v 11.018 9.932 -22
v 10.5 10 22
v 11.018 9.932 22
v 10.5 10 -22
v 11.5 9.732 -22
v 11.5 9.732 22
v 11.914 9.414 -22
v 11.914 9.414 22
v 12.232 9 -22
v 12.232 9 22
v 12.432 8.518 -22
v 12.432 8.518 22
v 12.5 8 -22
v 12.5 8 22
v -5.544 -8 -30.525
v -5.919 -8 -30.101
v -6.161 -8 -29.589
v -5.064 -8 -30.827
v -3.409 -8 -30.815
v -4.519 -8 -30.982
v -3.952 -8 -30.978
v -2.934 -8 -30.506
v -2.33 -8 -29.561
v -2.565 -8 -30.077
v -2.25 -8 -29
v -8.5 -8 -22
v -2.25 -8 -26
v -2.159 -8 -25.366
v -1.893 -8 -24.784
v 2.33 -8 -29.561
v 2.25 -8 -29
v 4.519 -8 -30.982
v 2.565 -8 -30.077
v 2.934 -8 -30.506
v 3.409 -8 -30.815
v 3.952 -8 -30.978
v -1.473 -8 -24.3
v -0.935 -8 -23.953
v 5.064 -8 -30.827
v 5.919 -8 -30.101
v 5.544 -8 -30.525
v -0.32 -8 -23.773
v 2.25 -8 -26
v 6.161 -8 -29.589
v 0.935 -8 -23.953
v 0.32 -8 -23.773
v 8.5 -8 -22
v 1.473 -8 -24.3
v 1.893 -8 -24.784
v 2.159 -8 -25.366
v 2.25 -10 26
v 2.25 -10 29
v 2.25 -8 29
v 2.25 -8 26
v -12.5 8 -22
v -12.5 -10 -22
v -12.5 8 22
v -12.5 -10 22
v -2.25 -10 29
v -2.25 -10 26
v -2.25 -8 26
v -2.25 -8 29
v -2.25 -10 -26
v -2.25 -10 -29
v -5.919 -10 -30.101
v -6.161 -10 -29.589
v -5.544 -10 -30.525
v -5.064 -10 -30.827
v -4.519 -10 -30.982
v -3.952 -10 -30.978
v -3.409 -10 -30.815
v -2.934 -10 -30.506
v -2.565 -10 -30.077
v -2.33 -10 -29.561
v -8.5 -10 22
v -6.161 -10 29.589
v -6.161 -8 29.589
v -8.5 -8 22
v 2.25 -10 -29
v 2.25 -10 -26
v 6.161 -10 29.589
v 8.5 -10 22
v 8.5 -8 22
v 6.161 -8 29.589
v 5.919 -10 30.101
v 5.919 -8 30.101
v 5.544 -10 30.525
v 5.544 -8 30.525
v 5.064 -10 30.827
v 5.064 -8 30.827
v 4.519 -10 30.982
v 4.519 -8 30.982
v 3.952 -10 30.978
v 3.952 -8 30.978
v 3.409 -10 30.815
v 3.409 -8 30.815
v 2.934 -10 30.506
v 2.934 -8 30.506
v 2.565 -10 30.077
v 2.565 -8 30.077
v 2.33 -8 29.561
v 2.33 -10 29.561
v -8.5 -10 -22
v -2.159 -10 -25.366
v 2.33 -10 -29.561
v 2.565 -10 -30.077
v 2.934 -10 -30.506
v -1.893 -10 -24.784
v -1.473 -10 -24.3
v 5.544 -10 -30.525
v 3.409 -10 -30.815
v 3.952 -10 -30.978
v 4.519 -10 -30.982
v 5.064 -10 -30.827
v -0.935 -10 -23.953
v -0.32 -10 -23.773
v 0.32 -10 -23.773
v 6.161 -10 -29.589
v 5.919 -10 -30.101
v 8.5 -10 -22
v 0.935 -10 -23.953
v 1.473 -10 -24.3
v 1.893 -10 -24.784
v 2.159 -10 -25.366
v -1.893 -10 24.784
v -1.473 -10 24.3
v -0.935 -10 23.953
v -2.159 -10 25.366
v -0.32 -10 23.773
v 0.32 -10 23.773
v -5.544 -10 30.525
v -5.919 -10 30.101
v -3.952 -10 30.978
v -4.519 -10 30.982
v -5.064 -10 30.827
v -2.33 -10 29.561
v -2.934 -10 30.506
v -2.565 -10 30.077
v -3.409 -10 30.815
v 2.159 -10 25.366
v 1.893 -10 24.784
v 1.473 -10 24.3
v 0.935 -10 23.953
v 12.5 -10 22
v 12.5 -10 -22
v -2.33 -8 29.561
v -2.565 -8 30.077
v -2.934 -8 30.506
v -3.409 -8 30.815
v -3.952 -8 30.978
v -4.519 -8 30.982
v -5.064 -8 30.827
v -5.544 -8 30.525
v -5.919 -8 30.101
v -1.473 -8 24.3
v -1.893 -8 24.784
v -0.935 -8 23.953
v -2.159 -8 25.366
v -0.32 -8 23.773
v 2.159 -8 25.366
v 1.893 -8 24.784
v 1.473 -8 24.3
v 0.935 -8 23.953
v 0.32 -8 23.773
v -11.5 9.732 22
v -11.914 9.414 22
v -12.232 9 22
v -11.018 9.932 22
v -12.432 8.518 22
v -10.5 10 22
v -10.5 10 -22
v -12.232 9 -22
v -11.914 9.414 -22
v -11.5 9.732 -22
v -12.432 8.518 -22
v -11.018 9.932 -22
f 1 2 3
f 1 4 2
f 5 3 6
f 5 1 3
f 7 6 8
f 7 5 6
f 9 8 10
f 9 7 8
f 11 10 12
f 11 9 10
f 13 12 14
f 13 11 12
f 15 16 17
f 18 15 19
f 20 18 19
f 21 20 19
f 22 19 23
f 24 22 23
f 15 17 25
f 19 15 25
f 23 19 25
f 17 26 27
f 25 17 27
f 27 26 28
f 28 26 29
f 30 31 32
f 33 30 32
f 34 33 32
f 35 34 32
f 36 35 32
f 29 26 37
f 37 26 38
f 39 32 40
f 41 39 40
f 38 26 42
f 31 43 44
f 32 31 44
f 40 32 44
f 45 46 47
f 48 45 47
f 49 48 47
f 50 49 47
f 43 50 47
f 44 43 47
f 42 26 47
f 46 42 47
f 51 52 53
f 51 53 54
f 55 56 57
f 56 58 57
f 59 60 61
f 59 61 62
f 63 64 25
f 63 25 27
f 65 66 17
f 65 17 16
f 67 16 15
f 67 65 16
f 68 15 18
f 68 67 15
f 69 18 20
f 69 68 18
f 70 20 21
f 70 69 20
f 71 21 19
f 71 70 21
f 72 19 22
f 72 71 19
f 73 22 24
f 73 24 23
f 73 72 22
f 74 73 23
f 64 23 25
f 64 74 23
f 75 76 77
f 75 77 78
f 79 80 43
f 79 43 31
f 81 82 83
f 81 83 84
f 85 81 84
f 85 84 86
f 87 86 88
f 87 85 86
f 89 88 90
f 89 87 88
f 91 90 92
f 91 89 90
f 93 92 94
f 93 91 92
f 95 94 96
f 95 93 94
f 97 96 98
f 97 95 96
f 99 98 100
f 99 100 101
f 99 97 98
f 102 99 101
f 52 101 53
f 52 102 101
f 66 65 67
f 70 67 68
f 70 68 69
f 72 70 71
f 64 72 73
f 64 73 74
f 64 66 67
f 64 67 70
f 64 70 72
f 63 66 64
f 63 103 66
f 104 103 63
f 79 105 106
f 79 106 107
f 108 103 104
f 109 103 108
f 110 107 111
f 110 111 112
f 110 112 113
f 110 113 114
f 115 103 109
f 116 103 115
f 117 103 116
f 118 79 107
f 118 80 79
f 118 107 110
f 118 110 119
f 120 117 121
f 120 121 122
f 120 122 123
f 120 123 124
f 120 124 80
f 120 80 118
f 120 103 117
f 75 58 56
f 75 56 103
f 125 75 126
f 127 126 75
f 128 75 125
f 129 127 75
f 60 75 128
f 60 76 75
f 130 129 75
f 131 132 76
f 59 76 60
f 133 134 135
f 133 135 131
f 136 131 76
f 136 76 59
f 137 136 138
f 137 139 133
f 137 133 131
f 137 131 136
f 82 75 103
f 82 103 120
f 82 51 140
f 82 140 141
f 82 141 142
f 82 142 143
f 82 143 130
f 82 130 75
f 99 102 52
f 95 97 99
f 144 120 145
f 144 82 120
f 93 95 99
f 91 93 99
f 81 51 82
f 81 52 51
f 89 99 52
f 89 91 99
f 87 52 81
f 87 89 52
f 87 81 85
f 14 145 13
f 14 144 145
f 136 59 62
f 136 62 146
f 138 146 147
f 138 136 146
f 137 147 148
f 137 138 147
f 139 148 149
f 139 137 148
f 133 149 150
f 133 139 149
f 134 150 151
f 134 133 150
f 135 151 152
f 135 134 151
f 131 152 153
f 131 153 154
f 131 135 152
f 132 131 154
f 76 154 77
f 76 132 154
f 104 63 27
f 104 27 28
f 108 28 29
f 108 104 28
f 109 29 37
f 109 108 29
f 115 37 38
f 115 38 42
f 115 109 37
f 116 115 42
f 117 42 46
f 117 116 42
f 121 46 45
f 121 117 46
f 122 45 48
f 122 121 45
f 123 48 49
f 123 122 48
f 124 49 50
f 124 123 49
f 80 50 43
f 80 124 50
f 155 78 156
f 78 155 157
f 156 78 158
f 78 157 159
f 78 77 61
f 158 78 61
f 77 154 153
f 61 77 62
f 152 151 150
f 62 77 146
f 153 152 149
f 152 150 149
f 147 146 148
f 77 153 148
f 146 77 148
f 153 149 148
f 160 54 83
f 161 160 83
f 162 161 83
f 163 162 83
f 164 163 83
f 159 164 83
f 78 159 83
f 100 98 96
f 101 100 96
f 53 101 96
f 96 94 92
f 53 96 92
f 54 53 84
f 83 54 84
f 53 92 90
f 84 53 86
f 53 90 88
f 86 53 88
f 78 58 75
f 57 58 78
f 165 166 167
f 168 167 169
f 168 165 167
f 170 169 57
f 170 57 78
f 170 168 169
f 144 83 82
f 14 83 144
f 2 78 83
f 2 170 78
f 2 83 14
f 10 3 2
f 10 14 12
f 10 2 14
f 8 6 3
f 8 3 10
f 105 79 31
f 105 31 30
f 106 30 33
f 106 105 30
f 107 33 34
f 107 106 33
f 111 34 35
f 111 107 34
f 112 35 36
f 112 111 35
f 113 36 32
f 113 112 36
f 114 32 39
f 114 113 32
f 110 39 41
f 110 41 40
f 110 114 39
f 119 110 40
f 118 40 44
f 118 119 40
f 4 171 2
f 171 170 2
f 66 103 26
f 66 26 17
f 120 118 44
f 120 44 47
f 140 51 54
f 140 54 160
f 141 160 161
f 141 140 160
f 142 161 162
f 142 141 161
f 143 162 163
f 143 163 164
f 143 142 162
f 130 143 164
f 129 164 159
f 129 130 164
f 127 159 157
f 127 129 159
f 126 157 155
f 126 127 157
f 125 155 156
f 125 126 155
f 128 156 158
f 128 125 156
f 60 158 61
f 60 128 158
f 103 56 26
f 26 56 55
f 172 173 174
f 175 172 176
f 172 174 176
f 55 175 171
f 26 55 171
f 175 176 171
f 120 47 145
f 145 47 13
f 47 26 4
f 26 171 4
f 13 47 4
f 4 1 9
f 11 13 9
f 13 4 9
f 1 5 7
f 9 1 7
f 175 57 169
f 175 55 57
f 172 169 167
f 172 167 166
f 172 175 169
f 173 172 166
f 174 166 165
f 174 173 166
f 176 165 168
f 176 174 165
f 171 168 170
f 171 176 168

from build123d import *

# Parameters (mm, degrees)
SKETCH_1_W      = 25
SKETCH_1_H      = 20
EXTRUDE_1_DEPTH = 22
EXTRUDE_2_DEPTH = 2
FILLET_1_R      = 2


with BuildPart() as part:
    # 草图1 → 凸台-拉伸1 (new, symmetric)
    with BuildSketch(Plane.XY):
        Rectangle(SKETCH_1_W, SKETCH_1_H)
    extrude(amount=EXTRUDE_1_DEPTH, both=True)

    # 草图2 → 凸台-拉伸2 (add)
    with BuildSketch(Plane.XZ.offset(10)):
        with BuildLine():
            Line((-8.5, -22), (-6.161301565, -29.589004522))
            ThreePointArc((-6.161301565, -29.589004522), (-3.952177176, -30.977701081), (-2.25, -29))
            Line((-2.25, -29), (-2.25, -26))
            ThreePointArc((-2.25, -26), (0, -23.75), (2.25, -26))
            Line((2.25, -26), (2.25, -29))
            ThreePointArc((2.25, -29), (3.952177176, -30.977701081), (6.161301565, -29.589004522))
            Line((6.161301565, -29.589004522), (8.5, -22))
            Line((8.5, -22), (-8.5, -22))
        make_face()
        with BuildLine():
            Line((-8.5, 22), (8.5, 22))
            Line((8.5, 22), (6.161301565, 29.589004522))
            ThreePointArc((6.161301565, 29.589004522), (3.952177176, 30.977701081), (2.25, 29))
            Line((2.25, 29), (2.25, 26))
            ThreePointArc((2.25, 26), (0, 23.75), (-2.25, 26))
            Line((-2.25, 26), (-2.25, 29))
            ThreePointArc((-2.25, 29), (-3.952177176, 30.977701081), (-6.161301565, 29.589004522))
            Line((-6.161301565, 29.589004522), (-8.5, 22))
        make_face()
    extrude(amount=-EXTRUDE_2_DEPTH)

    # 圆角1
    fillet_1_edges = [part.edges().sort_by_distance(p)[0] for p in [
        (-12.5, 10, 0),
        (12.5, 10, 0),
    ]]
    fillet(fillet_1_edges, radius=FILLET_1_R)


solid = part.part
